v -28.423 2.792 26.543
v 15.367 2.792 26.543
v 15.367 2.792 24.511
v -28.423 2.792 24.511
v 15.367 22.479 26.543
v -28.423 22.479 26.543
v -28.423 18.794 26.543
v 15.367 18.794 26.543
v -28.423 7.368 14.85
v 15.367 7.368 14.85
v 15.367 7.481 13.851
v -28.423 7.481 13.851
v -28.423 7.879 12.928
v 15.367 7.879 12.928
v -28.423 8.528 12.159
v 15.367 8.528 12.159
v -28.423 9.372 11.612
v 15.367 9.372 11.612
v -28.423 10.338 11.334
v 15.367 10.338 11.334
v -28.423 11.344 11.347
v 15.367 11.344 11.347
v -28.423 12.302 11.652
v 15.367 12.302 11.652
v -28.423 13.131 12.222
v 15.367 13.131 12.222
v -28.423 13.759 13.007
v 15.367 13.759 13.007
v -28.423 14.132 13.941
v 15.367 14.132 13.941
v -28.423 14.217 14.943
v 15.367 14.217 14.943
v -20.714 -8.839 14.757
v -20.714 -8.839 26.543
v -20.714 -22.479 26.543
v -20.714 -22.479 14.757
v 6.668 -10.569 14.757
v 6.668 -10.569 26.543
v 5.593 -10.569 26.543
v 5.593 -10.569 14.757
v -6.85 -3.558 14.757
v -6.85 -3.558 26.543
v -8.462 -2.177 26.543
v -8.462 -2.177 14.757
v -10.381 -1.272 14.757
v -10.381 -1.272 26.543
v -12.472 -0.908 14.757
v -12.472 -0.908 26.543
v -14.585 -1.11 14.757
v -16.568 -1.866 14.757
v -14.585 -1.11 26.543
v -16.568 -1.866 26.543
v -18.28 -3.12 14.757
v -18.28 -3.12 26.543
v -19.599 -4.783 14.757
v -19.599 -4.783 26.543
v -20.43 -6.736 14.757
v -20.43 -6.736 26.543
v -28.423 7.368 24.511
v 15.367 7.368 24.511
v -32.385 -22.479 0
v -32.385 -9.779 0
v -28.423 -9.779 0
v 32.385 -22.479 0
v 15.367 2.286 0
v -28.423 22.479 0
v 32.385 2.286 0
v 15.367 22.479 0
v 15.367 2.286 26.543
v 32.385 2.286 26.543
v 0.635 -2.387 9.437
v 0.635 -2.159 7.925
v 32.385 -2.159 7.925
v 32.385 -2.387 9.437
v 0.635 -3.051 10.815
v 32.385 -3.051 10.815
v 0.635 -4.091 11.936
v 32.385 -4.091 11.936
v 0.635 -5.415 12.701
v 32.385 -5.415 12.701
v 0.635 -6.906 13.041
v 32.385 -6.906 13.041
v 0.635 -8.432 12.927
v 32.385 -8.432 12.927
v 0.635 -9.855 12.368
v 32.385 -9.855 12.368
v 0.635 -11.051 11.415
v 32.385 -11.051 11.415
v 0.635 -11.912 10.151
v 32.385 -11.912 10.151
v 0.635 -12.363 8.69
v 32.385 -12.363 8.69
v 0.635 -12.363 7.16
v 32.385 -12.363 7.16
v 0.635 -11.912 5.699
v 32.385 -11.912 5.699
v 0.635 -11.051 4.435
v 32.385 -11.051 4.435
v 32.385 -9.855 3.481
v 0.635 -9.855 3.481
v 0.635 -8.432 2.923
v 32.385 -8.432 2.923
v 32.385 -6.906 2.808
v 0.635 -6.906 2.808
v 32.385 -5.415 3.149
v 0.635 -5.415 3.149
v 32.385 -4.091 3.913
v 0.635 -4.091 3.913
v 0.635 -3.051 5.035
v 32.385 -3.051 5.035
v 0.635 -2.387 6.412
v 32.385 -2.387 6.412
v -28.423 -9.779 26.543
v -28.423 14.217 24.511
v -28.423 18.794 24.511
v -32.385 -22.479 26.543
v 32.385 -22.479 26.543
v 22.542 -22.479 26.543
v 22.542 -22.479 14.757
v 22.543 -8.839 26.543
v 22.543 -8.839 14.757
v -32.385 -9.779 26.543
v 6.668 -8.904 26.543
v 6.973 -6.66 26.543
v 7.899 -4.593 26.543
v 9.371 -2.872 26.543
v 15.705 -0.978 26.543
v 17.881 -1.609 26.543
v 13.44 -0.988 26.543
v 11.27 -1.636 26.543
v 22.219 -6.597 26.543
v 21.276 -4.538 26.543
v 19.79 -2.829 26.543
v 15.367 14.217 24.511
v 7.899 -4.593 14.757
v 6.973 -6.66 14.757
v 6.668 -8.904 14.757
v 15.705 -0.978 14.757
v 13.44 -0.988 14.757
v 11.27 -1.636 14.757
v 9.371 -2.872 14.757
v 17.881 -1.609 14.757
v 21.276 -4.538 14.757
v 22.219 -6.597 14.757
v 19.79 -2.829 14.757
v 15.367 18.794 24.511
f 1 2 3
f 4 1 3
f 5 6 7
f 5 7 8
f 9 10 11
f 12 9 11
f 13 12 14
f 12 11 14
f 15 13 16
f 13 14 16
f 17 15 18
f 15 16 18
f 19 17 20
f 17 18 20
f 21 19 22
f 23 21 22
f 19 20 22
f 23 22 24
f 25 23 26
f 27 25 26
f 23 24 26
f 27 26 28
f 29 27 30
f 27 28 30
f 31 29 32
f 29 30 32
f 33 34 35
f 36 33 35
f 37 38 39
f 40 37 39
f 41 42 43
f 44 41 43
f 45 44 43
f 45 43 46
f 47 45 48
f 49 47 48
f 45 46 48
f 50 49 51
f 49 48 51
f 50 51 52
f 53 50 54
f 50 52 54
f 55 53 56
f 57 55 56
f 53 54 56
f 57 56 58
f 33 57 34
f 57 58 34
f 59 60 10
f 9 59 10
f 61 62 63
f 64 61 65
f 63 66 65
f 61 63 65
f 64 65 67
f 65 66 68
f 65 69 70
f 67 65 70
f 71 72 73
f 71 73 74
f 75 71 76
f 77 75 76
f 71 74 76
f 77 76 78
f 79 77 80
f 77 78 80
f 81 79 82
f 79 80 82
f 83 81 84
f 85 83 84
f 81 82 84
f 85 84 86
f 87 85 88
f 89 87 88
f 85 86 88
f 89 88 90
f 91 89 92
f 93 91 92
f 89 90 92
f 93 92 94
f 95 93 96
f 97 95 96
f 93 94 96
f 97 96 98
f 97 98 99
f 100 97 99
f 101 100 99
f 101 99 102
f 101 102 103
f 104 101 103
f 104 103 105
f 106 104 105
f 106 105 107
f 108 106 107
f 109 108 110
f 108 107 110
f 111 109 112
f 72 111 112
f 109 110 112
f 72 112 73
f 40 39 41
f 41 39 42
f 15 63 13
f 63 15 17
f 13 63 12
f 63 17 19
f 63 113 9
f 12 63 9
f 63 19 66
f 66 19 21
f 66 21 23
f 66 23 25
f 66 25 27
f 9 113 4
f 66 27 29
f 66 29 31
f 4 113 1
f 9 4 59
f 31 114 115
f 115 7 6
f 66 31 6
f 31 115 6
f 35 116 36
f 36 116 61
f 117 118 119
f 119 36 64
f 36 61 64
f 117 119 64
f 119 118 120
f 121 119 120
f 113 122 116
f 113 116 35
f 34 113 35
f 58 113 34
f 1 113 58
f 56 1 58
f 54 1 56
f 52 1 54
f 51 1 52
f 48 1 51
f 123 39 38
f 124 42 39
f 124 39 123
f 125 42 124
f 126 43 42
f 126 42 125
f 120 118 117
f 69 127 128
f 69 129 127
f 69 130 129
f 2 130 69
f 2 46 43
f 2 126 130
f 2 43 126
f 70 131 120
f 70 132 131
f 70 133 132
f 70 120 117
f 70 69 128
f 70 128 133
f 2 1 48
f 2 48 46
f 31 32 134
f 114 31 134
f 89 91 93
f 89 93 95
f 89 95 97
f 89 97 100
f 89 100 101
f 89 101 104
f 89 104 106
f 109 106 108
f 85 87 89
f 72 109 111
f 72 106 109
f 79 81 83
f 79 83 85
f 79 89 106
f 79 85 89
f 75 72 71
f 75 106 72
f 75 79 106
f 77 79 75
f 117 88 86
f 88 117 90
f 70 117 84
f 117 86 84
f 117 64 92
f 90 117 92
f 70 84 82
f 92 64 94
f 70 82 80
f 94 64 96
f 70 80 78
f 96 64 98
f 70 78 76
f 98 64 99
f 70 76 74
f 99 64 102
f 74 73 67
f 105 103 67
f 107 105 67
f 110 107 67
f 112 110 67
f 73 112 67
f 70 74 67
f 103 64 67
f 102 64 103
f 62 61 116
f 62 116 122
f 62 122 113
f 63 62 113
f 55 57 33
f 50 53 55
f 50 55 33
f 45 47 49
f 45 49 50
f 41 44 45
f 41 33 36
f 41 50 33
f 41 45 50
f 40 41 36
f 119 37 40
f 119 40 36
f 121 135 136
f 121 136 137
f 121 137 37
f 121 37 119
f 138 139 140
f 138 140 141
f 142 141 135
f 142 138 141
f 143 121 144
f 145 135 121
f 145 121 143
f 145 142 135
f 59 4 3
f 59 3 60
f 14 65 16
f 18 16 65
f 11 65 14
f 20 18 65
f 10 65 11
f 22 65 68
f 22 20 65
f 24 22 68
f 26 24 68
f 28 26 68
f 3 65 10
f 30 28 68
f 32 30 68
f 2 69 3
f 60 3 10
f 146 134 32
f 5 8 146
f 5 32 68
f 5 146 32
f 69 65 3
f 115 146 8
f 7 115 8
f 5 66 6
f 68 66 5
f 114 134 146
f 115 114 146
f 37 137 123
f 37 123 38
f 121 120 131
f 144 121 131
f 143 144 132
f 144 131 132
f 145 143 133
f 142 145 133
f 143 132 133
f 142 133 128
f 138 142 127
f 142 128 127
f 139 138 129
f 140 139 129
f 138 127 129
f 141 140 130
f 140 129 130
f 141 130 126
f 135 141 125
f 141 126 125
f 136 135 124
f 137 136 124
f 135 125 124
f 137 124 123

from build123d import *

# Parameters (mm, degrees)
F0_W     = 64.77
F0_H     = 44.958
F1_DEPTH = 26.543
F2_W     = 3.9624
F2_H     = 32.258
F2_W_2   = 17.018
F2_H_2   = 20.193
F3_DEPTH = 26.544
F4_W     = 6.8494506996
F4_H     = 2.032
F5_DEPTH = 47.753
F7_DEPTH = 11.7856
F8_R     = 5.1308
F9_DEPTH = 31.75


with BuildPart() as f1:
    # F0 (on Top) → F1 (new body)
    with BuildSketch(Plane.XY):
        Rectangle(F0_W, F0_H)
    extrude(amount=F1_DEPTH)

    # F2 (on face) → F3 (cut, through all)
    with BuildSketch(Plane.XY.offset(26.543)):
        with Locations((-30.4038, 6.35)):
            Rectangle(F2_W, F2_H)
        with Locations((23.876, 12.3825)):
            Rectangle(F2_W_2, F2_H_2)
    extrude(amount=-F3_DEPTH, mode=Mode.SUBTRACT)

    # F4 (on face) → F5 (cut, through all)
    with BuildSketch(Plane.YZ.offset(15.367)):
        with BuildLine():
            Line((7.3680459394, 24.511), (7.3680459394, 14.8504350737))
            ThreePointArc((7.3680459394, 14.8504350737), (10.8413795833, 11.3033136722), (14.2174966391, 14.9430870806))
            Line((14.2174966391, 14.9430870806), (14.2174966391, 24.511))
            Line((14.2174966391, 24.511), (7.3680459394, 24.511))
        make_face()
        Polygon((2.7917712892, 24.511), (7.3680459394, 24.511), (7.3680459394, 26.543), (14.2174966391, 26.543), (14.2174966391, 24.511), (18.7937712892, 24.511), (18.7937712892, 28.575), (2.7917712892, 28.575), align=None)
        with Locations((10.7927712892, 25.527)):
            Rectangle(F4_W, F4_H)
    extrude(amount=-F5_DEPTH, mode=Mode.SUBTRACT)

    # F6 (on face) → F7 (cut)
    with BuildSketch(Plane.XY.offset(26.543)):
        with BuildLine():
            Line((22.5425, -22.479), (22.5425, -8.8392))
            ThreePointArc((22.5425, -8.8392), (14.5724547472, -0.9017667211), (6.6677668834, -8.9042899584))
            Line((6.6677668834, -8.9042899584), (6.6677668834, -10.5686287108))
            Line((6.6677668834, -10.5686287108), (5.5927410722, -10.5686287108))
            Line((5.5927410722, -10.5686287108), (-6.8503879466, -3.5582287108))
            ThreePointArc((-6.8503879466, -3.5582287108), (-15.6017772044, -1.421651907), (-20.7137, -8.8392))
            Line((-20.7137, -8.8392), (-20.7137, -22.479))
            Line((-20.7137, -22.479), (22.5425, -22.479))
        make_face()
    extrude(amount=-F7_DEPTH, mode=Mode.SUBTRACT)

    # F8 (on face) → F9 (cut)
    with BuildSketch(Plane.YZ.offset(32.385)):
        with Locations((-7.2898, 7.9248)):
            Circle(F8_R)
    extrude(amount=-F9_DEPTH, mode=Mode.SUBTRACT)


solid = f1.part
